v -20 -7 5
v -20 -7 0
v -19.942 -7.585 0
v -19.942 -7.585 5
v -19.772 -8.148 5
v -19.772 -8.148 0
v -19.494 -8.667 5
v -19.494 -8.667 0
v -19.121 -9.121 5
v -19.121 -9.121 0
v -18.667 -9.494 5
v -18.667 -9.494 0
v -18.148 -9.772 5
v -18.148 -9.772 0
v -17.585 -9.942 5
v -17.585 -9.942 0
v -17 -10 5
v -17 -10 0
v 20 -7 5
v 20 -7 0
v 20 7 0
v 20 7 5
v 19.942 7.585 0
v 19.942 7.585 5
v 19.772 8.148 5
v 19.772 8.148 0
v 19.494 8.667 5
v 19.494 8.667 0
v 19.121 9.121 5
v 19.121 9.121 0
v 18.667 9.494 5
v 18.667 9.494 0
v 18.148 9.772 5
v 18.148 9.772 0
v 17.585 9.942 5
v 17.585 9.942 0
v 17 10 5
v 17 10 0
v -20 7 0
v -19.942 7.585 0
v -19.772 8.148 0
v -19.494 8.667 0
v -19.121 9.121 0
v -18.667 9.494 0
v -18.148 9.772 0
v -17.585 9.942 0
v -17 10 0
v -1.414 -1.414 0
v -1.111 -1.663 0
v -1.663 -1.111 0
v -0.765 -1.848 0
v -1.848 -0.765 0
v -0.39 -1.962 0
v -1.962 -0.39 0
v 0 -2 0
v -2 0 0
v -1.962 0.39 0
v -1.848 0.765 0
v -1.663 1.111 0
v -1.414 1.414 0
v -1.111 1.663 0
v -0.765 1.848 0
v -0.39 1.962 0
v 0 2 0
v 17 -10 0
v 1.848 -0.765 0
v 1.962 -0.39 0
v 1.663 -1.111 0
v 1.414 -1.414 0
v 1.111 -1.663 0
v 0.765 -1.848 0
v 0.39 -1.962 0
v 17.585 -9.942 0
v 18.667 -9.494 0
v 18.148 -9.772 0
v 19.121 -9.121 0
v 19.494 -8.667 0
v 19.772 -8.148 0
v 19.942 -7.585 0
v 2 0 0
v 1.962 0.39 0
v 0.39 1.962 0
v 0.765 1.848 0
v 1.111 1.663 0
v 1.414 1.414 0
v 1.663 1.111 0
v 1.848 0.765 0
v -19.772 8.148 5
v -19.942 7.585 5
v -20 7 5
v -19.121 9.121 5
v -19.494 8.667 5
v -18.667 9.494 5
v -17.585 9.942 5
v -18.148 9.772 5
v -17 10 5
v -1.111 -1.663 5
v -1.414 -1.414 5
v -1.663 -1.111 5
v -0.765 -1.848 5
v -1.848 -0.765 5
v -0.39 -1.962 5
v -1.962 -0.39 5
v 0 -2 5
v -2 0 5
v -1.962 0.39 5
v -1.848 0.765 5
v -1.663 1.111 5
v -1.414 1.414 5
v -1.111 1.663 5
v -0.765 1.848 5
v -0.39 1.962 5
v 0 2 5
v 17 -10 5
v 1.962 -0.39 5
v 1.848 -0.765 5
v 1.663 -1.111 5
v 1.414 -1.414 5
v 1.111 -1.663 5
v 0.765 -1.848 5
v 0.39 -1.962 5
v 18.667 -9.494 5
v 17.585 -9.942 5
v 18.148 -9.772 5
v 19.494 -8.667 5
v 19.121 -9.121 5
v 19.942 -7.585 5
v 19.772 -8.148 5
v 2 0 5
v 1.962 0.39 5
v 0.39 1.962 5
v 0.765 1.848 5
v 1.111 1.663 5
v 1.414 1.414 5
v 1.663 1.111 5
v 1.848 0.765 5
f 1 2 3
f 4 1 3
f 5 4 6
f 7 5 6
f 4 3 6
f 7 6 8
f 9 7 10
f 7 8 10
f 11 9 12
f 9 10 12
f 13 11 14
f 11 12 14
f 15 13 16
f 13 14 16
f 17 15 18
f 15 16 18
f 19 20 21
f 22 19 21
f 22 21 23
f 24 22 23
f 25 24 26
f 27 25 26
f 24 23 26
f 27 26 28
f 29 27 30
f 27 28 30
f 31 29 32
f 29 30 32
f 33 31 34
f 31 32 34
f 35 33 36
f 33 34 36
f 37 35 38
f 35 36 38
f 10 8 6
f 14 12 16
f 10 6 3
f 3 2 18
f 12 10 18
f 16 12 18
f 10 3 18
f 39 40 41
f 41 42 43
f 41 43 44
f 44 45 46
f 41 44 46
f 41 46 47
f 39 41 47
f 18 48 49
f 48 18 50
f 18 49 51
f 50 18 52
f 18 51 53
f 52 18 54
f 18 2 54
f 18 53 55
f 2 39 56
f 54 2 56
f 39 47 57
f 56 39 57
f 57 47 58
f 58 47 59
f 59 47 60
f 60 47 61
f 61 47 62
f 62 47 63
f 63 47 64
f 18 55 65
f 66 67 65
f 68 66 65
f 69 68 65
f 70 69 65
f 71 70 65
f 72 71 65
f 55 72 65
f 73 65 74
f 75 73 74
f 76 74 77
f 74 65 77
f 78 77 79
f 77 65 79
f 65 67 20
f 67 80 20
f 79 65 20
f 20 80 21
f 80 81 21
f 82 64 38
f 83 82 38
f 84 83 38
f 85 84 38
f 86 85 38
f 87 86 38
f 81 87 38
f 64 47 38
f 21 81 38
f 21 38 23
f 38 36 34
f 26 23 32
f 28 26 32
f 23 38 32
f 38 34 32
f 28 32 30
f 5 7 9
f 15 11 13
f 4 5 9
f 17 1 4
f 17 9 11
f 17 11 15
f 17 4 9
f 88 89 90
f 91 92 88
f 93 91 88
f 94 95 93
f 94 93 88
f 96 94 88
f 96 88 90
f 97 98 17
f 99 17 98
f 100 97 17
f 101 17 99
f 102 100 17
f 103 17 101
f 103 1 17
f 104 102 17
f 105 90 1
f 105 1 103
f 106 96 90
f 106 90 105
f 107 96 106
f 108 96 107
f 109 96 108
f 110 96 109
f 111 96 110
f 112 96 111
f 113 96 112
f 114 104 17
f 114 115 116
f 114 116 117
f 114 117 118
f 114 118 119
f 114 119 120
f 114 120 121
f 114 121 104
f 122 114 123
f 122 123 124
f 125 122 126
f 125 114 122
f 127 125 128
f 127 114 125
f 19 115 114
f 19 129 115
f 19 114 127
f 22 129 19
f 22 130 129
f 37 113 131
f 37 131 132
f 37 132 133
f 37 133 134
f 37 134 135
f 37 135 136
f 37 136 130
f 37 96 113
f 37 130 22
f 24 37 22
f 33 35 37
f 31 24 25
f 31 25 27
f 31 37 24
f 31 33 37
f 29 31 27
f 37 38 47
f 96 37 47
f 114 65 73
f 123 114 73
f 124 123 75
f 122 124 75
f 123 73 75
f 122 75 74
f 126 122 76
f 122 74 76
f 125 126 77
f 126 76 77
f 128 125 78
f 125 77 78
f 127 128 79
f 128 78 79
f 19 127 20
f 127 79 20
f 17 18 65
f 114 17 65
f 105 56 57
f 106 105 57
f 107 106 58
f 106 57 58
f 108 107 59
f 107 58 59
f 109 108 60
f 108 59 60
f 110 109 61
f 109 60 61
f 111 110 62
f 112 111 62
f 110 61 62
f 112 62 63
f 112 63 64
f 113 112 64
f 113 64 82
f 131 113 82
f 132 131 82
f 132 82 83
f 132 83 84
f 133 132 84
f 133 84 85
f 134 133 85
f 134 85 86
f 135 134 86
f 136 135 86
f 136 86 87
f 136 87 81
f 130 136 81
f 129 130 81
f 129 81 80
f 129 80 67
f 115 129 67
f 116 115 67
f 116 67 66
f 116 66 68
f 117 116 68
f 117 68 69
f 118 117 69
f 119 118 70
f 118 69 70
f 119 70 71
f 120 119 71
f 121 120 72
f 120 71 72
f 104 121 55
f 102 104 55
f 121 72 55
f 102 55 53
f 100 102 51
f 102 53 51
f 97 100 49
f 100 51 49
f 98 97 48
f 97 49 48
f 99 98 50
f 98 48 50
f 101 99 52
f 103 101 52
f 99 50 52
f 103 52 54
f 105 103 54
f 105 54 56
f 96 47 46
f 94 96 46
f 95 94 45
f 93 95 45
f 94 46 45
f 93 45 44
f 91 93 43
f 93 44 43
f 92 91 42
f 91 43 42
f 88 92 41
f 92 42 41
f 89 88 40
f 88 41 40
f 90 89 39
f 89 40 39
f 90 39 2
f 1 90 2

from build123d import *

# Parameters (mm, degrees)
BOSS_EXTRUDE1_DEPTH = 5
CUT_EXTRUDE1_REACH  = 24.913
SKETCH2_R           = 2


with BuildPart() as part:
    # Sketch1 → Boss-Extrude1 (new body)
    with BuildSketch(Plane.XY):
        with BuildLine():
            Line((17, 10), (-17, 10))
            ThreePointArc((-17, 10), (-19.121320344, 9.121320344), (-20, 7))
            Line((-20, 7), (-20, -7))
            ThreePointArc((-20, -7), (-19.121320344, -9.121320344), (-17, -10))
            Line((-17, -10), (17, -10))
            ThreePointArc((17, -10), (19.121320344, -9.121320344), (20, -7))
            Line((20, -7), (20, 7))
            ThreePointArc((20, 7), (19.121320344, 9.121320344), (17, 10))
        make_face()
    extrude(amount=BOSS_EXTRUDE1_DEPTH)

    # Sketch2 → Cut-Extrude1 (cut, up to next)
    with BuildSketch(Plane(origin=(0, 0, 0), x_dir=(-1, 0, 0), z_dir=(0, 0, -1)), mode=Mode.PRIVATE) as cut_extrude1_sk1:
        Circle(SKETCH2_R)
    cut_extrude1_tool1 = extrude(cut_extrude1_sk1.sketch, amount=-CUT_EXTRUDE1_REACH, mode=Mode.PRIVATE) & part.part
    add(cut_extrude1_tool1.solids().sort_by_distance((0, 0, 0))[0], mode=Mode.SUBTRACT)


solid = part.part
